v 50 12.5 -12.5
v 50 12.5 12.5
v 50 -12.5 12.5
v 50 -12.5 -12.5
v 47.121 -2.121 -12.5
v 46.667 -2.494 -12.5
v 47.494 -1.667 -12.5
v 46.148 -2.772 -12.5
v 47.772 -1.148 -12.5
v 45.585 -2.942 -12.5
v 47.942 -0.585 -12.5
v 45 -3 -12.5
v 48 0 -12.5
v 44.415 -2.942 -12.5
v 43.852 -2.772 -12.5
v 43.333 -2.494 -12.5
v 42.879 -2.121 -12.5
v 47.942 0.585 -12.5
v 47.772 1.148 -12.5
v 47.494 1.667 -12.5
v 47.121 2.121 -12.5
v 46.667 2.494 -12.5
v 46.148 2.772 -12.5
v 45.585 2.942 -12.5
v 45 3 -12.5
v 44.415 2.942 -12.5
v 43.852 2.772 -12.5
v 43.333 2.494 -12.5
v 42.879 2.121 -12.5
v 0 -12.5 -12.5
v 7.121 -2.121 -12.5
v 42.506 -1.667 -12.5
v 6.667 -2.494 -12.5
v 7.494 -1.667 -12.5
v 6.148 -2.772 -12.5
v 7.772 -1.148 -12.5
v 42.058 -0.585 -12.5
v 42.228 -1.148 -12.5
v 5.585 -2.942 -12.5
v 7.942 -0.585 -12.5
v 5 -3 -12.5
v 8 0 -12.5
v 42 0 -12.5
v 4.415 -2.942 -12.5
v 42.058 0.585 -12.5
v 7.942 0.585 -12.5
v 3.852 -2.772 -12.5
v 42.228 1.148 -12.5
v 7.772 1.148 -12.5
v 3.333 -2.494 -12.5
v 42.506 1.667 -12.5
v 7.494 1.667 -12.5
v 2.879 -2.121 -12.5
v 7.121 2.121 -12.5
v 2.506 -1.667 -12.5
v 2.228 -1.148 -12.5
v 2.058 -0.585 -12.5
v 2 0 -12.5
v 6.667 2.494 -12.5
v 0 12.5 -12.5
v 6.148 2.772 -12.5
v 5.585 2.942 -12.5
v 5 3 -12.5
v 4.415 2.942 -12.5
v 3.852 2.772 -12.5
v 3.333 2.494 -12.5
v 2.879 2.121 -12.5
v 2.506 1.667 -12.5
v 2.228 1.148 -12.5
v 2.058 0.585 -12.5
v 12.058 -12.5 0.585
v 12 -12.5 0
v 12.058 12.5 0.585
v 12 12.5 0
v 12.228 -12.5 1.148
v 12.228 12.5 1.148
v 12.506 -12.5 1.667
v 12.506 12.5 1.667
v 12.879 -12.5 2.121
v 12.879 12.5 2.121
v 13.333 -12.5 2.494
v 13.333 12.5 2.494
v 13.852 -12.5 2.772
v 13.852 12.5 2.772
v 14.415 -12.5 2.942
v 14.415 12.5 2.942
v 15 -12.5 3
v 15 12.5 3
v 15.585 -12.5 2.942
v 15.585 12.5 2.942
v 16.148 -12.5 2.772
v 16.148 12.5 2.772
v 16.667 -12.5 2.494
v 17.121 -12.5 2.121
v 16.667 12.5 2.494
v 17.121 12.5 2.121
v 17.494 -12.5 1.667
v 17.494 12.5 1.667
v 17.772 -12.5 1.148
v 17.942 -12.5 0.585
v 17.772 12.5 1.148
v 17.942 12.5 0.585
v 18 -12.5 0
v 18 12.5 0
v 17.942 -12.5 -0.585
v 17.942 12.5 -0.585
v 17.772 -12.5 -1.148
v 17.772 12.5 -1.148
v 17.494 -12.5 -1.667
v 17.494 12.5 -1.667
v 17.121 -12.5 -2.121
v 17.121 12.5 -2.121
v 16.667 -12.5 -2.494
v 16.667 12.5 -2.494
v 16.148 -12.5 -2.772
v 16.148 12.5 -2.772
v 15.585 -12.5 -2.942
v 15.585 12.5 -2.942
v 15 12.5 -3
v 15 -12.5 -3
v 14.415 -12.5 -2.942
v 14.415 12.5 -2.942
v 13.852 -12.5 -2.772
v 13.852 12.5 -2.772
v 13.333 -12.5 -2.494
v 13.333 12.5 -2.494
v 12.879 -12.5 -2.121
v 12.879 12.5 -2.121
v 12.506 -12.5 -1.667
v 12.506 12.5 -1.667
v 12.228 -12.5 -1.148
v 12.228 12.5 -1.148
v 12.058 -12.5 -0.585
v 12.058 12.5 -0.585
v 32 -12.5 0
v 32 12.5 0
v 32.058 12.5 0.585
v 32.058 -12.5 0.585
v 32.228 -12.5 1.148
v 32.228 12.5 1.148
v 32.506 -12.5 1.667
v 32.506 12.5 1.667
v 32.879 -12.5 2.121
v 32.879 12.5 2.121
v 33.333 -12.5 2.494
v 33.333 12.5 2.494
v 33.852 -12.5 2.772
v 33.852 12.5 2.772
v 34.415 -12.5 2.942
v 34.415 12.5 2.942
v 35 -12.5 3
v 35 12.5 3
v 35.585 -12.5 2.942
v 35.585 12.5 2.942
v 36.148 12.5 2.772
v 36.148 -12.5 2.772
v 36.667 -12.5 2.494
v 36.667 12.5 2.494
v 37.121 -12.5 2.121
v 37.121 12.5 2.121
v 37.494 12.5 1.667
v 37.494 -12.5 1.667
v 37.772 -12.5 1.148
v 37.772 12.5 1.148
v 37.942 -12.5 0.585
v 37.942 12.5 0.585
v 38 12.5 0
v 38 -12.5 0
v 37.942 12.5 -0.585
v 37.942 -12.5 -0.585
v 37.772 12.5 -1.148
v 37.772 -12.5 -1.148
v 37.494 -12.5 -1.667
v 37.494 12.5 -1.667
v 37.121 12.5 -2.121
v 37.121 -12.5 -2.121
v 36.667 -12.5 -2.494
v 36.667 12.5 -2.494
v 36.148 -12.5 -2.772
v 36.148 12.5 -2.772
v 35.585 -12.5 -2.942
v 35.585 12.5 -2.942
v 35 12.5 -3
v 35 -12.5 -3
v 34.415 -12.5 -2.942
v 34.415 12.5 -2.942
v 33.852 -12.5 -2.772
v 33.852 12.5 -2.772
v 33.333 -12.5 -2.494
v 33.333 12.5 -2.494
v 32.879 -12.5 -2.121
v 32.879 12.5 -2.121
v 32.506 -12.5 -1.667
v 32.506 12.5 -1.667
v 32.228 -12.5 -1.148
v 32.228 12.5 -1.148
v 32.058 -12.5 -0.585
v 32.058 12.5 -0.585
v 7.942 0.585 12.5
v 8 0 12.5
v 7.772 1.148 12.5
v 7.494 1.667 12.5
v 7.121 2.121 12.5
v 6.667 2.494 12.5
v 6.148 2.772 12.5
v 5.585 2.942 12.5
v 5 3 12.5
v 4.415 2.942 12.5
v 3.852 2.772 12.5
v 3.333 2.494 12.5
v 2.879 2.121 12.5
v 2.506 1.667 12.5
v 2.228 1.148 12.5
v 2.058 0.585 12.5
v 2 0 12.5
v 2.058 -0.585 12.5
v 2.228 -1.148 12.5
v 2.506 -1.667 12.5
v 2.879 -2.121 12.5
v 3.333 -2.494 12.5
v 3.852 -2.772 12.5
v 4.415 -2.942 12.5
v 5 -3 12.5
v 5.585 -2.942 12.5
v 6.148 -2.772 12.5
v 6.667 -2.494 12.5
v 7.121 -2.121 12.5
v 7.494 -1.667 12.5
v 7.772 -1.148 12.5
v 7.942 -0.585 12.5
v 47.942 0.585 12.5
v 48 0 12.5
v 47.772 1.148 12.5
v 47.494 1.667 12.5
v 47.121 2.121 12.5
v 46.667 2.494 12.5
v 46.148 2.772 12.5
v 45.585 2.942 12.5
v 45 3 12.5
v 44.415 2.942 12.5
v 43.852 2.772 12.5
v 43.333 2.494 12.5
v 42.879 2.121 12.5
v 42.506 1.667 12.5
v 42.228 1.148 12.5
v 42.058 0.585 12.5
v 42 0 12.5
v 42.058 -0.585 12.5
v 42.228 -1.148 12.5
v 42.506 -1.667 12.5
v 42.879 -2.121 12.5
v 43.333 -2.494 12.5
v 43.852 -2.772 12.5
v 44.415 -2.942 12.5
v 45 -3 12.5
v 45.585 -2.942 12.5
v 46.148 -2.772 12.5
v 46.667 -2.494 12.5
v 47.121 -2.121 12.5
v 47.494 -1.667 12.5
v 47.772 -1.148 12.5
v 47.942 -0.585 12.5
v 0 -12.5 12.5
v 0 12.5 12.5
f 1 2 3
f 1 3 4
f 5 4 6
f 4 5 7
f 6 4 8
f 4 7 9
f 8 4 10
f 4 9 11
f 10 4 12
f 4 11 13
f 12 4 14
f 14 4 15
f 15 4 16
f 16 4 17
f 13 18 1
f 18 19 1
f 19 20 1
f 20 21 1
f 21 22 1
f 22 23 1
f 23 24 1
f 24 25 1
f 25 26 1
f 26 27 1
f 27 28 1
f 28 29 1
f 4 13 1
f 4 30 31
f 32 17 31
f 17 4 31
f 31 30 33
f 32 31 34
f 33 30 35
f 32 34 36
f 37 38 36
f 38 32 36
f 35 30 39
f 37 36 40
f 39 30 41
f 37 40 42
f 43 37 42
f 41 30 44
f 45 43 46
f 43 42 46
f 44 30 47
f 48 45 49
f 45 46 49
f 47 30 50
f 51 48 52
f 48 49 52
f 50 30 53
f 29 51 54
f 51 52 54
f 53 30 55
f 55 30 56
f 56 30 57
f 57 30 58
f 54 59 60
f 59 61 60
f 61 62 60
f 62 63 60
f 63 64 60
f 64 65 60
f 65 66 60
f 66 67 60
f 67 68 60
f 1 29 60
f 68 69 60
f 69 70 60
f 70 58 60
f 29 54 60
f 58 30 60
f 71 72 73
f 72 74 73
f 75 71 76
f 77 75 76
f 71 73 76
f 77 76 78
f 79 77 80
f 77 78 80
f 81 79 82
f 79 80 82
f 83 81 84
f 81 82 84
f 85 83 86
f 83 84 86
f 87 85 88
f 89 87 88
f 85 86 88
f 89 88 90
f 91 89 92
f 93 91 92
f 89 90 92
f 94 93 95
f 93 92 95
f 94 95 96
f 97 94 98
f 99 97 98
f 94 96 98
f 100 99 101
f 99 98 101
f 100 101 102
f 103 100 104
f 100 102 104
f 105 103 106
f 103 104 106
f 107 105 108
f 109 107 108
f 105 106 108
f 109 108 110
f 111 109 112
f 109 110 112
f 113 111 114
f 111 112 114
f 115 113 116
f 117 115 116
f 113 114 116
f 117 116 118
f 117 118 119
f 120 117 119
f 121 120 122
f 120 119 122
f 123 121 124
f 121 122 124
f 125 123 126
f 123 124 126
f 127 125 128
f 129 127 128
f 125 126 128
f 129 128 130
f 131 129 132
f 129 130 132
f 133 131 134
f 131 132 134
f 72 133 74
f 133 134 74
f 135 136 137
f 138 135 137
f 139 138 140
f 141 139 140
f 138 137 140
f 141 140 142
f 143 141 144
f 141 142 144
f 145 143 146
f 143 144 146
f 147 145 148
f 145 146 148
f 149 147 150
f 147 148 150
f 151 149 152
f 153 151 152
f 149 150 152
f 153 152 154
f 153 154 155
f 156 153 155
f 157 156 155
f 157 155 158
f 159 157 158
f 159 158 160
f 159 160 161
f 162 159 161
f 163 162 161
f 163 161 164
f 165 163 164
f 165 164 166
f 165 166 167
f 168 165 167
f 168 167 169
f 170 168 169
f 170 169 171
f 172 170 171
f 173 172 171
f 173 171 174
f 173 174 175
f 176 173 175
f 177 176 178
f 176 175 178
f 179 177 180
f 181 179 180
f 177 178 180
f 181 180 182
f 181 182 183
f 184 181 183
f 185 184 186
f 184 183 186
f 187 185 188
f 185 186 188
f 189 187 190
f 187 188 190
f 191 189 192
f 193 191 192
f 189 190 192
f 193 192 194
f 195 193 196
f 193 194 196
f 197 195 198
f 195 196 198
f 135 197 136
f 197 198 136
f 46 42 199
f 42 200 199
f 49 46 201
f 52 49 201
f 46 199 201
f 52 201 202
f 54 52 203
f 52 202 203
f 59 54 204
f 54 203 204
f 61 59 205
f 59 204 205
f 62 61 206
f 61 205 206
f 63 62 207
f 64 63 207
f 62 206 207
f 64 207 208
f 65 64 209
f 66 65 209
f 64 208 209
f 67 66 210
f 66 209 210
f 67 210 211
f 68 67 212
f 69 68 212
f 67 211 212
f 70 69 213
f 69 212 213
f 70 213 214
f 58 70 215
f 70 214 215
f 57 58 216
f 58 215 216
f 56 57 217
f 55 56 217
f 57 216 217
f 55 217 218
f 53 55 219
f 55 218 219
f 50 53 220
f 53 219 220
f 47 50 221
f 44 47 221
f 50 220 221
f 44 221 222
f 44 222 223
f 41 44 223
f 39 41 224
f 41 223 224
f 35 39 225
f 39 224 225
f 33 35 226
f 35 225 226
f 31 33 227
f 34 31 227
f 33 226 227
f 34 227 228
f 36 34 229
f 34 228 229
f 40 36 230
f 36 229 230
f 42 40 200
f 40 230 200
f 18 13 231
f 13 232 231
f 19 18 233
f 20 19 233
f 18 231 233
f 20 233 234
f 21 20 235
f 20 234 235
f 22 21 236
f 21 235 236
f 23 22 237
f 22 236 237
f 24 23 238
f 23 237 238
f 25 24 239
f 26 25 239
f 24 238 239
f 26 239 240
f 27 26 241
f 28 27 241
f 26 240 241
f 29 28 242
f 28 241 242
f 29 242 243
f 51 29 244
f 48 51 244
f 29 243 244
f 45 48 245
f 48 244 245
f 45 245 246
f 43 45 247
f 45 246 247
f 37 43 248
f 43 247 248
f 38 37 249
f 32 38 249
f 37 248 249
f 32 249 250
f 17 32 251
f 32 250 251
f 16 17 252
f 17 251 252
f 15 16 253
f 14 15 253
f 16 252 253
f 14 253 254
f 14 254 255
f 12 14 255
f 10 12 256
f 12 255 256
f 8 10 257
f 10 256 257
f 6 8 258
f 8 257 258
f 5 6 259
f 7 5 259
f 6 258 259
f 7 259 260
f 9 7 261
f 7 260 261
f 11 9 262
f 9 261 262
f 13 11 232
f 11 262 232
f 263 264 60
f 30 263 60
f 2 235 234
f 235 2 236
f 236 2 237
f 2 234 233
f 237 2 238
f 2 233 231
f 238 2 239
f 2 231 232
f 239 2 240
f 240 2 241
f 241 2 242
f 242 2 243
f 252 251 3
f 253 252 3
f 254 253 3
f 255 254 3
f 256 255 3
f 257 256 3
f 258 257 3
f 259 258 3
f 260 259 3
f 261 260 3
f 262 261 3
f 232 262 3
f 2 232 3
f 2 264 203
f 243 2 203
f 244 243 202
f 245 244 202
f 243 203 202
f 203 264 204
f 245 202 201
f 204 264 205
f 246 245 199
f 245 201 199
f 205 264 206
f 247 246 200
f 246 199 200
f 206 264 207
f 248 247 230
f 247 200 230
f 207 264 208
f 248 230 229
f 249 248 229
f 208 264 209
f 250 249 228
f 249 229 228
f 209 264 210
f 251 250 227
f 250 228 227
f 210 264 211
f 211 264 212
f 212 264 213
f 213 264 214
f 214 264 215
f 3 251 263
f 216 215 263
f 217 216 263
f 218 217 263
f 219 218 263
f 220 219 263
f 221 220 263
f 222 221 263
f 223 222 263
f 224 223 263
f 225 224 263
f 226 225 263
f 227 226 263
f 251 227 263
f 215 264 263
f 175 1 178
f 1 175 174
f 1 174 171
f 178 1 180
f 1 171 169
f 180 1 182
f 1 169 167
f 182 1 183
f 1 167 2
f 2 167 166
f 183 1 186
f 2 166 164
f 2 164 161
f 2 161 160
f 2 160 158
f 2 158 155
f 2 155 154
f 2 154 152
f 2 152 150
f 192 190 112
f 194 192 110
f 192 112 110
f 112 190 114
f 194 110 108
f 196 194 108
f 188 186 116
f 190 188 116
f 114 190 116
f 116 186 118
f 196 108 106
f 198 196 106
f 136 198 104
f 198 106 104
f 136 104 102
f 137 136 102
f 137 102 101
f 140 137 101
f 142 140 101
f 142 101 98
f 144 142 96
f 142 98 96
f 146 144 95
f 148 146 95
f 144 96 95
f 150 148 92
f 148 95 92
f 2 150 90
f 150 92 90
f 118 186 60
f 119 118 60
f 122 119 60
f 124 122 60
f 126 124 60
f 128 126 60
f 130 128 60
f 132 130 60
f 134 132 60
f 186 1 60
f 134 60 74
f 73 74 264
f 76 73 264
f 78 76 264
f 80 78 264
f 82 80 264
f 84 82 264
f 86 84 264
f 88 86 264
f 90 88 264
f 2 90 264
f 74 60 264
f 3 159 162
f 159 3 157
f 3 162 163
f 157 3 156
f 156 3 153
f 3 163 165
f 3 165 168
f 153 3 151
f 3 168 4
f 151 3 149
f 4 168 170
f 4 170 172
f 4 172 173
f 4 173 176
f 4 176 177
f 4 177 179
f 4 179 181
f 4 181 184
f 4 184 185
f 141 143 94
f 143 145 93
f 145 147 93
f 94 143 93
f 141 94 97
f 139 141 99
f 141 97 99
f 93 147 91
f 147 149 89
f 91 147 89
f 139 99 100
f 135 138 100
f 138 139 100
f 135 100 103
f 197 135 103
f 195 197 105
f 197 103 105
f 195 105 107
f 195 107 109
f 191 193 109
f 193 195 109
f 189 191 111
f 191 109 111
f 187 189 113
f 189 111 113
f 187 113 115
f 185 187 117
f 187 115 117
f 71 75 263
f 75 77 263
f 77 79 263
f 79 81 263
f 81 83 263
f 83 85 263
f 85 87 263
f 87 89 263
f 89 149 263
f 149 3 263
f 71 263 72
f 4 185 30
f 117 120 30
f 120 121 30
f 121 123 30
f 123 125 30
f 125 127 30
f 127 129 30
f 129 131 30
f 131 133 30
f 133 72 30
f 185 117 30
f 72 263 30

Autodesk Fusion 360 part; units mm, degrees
sketch "Sketch1" plane through (0, 0, 0) normal (1, 0, 0) x (0, 0, -1)
  line L0 (12.5, 12.5) -> (-12.5, 12.5)
  line L1 (-12.5, 12.5) -> (-12.5, -12.5)
  line L2 (-12.5, -12.5) -> (12.5, -12.5)
  line L3 (12.5, -12.5) -> (12.5, 12.5)
  line L4 (12.5, 12.5) -> (-12.5, -12.5) construction
  line L5 (-12.5, 12.5) -> (12.5, -12.5) construction
  dimension "d1" = 25
  dimension "d2" = 25
extrude "Extrude1" add sketch "Sketch1" along normal blind 50
sketch "Sketch2" plane through (0, 0, 12.5) normal (0, 0, 1) x (1, 0, 0)
  line L0 (0, 12.5) -> (0, -12.5)
  line L1 (0, -12.5) -> (50, -12.5)
  line L2 (50, -12.5) -> (50, 12.5)
  line L3 (50, 12.5) -> (0, 12.5)
  circle A0 centre (5, 0) radius 3
  line L4 (25, 12.5) -> (25, -12.5) construction
  circle A1 centre (45, 0) radius 3
  dimension "d5" = 6
  dimension "d8" = 20
sketch "Sketch3" plane through (0, 12.5, 0) normal (0, 1, 0) x (-1, 0, 0)
  line L0 (0, -12.5) -> (0, 12.5)
  line L1 (0, 12.5) -> (-50, 12.5)
  line L2 (-50, 12.5) -> (-50, -12.5)
  line L3 (-50, -12.5) -> (0, -12.5)
  line L4 (-25, -12.5) -> (-25, 12.5) construction
  circle A0 centre (-15, 0) radius 3
  circle A1 centre (-35, 0) radius 3
  dimension "d9" = 6
  dimension "d10" = 10
extrude "Extrude2" cut sketch "Sketch3" against normal through all contours A0 | A1
extrude "Extrude3" cut sketch "Sketch2" against normal through all contours A0 | A1
